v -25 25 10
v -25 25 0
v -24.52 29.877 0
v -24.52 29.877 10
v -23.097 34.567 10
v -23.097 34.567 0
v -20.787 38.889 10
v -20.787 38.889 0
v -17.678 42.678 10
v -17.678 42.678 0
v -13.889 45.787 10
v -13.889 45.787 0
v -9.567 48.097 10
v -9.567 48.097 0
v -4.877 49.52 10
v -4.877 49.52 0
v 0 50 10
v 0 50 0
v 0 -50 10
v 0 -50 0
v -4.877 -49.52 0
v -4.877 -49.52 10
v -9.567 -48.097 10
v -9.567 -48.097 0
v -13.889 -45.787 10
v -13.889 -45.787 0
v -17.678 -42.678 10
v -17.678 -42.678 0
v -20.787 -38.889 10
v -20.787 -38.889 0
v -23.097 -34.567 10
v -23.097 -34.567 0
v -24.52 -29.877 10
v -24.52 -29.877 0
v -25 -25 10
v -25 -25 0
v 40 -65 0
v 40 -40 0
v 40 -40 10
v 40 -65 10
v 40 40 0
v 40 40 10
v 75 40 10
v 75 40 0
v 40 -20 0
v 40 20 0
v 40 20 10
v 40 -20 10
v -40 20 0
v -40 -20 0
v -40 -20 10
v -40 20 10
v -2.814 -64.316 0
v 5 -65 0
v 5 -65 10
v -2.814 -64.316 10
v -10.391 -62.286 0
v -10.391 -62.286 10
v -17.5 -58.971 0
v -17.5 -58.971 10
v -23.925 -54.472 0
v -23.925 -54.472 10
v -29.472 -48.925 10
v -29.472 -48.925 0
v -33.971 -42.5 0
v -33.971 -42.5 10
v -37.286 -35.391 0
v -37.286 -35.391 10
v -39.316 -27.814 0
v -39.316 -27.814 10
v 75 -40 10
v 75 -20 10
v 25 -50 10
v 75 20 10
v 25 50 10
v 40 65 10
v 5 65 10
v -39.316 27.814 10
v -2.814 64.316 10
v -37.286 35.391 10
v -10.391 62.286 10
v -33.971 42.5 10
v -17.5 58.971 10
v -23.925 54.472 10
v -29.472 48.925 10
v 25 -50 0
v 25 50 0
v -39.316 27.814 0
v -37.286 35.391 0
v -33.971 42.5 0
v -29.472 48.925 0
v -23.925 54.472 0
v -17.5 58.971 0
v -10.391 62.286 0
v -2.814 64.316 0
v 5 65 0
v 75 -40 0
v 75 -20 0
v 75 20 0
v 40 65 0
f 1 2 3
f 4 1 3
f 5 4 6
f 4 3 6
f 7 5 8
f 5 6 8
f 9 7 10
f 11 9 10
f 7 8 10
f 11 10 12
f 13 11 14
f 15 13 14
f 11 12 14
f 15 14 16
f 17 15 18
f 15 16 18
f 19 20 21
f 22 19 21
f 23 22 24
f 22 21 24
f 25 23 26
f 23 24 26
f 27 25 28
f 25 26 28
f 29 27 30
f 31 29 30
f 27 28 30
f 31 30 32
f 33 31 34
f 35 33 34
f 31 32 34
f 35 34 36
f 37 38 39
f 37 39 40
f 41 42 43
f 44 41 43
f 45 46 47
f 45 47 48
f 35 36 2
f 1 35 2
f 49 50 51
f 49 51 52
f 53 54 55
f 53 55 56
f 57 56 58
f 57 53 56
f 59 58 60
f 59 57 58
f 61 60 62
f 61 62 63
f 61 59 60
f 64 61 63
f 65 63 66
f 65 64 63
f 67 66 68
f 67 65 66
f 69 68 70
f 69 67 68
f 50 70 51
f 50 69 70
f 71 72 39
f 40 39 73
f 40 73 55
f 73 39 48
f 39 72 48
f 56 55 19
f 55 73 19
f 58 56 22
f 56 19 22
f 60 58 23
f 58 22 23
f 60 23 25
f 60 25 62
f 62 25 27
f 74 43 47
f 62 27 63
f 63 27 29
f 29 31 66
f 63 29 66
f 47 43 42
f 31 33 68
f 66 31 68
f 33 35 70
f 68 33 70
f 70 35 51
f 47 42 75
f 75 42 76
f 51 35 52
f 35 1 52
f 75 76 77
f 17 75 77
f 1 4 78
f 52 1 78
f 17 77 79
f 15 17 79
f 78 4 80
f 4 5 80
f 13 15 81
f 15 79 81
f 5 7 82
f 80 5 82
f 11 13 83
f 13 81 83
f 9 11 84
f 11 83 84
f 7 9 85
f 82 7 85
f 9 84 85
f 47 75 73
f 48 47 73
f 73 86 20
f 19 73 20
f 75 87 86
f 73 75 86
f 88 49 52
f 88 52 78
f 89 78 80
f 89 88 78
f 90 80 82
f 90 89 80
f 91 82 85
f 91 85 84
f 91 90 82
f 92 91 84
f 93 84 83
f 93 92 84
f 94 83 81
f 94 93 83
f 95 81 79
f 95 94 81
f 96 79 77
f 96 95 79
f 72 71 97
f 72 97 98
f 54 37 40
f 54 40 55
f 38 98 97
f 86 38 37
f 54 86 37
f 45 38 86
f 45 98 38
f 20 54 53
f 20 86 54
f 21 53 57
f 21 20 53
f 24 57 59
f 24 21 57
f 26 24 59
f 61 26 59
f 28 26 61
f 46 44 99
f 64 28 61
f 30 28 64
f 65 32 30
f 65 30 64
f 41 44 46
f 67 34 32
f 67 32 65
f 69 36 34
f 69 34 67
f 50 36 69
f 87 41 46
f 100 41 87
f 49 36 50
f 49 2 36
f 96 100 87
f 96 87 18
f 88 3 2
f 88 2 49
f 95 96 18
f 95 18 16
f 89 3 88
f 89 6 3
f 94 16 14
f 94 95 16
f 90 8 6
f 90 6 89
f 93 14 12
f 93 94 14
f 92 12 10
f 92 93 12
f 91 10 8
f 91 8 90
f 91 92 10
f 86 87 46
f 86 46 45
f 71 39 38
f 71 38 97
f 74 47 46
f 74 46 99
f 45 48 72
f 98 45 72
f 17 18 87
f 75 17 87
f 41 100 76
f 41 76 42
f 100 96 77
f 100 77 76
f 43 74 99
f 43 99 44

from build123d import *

# Parameters (mm, degrees)
BOSS_EXTRU_1_DEPTH = 10
ESQUISSE2_W        = 35
ESQUISSE2_H        = 20
BOSS_EXTRU_2_DEPTH = 10


with BuildPart() as part:
    # Esquisse1 → Boss.-Extru.1 (new body)
    with BuildSketch(Plane.XY):
        with BuildLine():
            Line((5, 65), (40, 65))
            Line((40, 65), (40, -65))
            Line((40, -65), (5, -65))
            ThreePointArc((5, -65), (-26.819805153, -51.819805153), (-40, -20))
            Line((-40, -20), (-40, 20))
            ThreePointArc((-40, 20), (-26.819805153, 51.819805153), (5, 65))
        make_face()
        with BuildLine():
            Line((0, 50), (25, 50))
            Line((25, 50), (25, -50))
            Line((25, -50), (0, -50))
            ThreePointArc((0, -50), (-17.67766953, -42.67766953), (-25, -25))
            Line((-25, -25), (-25, 25))
            ThreePointArc((-25, 25), (-17.67766953, 42.67766953), (0, 50))
        make_face(mode=Mode.SUBTRACT)
    extrude(amount=BOSS_EXTRU_1_DEPTH)

    # Esquisse2 → Boss.-Extru.2 (add)
    with BuildSketch(Plane.XY.offset(10)):
        with Locations((57.5, 30)):
            Rectangle(ESQUISSE2_W, ESQUISSE2_H)
        with Locations((57.5, -30)):
            Rectangle(ESQUISSE2_W, ESQUISSE2_H)
    extrude(amount=-BOSS_EXTRU_2_DEPTH)


solid = part.part
